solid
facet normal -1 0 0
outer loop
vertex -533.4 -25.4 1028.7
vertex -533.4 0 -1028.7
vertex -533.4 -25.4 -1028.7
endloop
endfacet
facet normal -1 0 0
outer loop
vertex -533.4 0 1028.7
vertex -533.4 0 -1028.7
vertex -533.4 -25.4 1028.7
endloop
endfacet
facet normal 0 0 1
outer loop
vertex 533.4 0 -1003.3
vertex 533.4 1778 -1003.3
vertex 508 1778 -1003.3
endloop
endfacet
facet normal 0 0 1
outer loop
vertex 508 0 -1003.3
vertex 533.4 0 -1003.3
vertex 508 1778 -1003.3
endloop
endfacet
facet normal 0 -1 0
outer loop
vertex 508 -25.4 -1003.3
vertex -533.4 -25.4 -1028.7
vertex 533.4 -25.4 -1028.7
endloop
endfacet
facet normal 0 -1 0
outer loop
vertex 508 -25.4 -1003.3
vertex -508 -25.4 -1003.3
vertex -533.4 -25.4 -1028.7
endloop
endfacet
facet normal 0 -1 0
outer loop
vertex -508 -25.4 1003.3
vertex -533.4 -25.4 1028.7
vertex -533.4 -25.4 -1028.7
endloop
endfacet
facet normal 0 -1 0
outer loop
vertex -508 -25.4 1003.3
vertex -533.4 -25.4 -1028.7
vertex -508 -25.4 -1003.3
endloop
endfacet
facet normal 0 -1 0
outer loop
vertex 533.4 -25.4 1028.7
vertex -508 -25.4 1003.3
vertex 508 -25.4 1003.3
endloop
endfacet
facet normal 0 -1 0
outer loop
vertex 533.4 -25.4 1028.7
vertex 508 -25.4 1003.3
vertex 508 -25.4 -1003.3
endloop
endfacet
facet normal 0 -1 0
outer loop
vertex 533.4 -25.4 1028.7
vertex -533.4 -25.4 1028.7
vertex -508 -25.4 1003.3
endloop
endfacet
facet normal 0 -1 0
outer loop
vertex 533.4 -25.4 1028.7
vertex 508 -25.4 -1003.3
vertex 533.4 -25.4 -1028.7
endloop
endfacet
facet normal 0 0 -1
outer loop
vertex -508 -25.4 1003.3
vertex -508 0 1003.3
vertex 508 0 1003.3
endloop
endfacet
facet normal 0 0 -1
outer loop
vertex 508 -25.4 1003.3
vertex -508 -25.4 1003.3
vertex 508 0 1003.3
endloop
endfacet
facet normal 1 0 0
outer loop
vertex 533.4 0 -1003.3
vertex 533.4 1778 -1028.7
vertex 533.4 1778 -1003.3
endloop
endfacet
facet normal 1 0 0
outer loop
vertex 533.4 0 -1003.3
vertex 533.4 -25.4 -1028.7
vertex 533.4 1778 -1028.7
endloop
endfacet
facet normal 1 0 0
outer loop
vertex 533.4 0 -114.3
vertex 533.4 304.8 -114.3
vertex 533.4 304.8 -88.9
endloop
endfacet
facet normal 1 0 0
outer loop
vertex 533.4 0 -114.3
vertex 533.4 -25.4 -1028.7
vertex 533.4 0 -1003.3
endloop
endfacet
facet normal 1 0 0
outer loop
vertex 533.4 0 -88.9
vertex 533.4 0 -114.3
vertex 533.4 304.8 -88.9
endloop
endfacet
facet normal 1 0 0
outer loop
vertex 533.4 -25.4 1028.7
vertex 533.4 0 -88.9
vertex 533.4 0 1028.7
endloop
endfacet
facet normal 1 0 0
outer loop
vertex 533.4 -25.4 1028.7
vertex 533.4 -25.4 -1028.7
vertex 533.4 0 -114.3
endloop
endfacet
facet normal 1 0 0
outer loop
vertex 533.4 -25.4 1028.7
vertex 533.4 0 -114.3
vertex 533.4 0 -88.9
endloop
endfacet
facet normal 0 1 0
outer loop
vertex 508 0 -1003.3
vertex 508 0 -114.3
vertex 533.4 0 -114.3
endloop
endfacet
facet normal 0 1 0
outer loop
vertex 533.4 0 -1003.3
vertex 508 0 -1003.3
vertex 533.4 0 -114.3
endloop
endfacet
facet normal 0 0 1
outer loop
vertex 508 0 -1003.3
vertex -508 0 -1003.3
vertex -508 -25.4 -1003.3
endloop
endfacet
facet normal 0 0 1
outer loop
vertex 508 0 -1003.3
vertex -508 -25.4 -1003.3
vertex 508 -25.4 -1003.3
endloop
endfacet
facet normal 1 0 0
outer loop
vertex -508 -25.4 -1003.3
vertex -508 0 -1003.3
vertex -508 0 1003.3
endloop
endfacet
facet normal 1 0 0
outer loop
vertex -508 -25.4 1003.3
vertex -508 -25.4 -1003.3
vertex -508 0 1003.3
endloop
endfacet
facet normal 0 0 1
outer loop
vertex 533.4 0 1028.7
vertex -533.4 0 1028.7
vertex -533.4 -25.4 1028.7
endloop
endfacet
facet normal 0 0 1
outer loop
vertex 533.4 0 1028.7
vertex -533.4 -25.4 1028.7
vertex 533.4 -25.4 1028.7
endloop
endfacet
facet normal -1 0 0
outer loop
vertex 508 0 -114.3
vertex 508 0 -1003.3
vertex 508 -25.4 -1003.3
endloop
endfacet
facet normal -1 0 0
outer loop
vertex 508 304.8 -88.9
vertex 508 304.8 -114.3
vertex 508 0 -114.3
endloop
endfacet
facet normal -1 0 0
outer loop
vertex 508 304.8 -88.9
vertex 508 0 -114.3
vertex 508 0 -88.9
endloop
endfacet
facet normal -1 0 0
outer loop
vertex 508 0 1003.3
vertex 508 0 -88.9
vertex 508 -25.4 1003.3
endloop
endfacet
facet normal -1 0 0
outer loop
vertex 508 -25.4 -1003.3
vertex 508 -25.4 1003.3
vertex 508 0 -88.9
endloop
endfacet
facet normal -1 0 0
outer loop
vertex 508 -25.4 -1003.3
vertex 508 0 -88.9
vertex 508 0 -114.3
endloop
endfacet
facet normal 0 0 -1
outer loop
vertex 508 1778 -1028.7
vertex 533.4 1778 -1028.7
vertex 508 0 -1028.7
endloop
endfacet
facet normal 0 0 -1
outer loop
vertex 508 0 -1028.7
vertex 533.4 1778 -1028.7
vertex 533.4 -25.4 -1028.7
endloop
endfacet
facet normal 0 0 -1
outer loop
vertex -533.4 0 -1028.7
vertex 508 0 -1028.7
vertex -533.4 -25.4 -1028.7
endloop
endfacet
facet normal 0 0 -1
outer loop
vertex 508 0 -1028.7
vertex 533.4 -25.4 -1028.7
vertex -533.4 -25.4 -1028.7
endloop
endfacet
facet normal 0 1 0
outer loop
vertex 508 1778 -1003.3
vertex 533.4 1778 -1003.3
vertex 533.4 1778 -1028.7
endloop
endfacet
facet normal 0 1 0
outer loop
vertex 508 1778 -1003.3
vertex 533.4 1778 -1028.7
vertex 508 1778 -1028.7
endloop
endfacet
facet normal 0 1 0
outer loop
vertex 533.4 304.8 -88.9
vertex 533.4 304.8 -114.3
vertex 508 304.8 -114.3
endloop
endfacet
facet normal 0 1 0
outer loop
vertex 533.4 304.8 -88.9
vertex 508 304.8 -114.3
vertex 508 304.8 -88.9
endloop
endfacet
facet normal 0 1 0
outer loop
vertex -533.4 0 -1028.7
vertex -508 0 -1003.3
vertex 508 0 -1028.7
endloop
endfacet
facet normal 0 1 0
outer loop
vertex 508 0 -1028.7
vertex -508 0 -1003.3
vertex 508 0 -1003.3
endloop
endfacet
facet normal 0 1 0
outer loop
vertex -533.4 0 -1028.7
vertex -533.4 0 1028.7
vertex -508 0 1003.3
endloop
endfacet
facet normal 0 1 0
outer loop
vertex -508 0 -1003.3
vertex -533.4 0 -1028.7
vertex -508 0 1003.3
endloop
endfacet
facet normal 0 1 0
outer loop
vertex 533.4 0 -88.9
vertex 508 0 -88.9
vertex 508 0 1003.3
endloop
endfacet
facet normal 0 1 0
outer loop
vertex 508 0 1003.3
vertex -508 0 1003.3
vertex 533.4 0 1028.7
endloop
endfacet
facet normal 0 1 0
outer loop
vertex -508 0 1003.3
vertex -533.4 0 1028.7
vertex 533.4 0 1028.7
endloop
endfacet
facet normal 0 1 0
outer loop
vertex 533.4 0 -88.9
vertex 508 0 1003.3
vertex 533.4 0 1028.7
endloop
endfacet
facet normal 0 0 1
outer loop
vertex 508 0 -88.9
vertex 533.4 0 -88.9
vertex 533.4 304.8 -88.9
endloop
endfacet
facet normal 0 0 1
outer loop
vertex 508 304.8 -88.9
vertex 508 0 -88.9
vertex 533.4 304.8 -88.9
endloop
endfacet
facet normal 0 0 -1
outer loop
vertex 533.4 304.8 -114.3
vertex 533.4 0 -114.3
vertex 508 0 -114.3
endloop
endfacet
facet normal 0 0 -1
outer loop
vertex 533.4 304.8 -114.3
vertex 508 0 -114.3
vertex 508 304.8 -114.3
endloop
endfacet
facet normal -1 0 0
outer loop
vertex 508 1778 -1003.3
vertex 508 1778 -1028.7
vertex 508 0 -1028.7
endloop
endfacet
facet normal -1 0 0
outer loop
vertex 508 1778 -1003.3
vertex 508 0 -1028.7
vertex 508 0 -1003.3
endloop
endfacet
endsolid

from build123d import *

# Parameters (mm, degrees)
F0_W     = 1066.8
F0_H     = 2057.4
F0_W_2   = 1016
F0_H_2   = 2006.6
F1_DEPTH = 25.4
F2_W     = 304.8
F2_H     = 25.4
F3_DEPTH = 25.4
F4_W     = 25.4
F4_H     = 25.4
F5_DEPTH = 1778


with BuildPart() as f1:
    # F0 (on Front) → F1 (new body)
    with BuildSketch(Plane.XZ):
        Rectangle(F0_W, F0_H)
        Rectangle(F0_W_2, F0_H_2, mode=Mode.SUBTRACT)
    extrude(amount=F1_DEPTH)

    # F2 (on face) → F3 (join)
    with BuildSketch(Plane.YZ.offset(533.4)):
        with Locations((152.4, -101.6)):
            Rectangle(F2_W, F2_H)
    extrude(amount=-F3_DEPTH)

    # F4 (on face) → F5 (join)
    with BuildSketch(Plane(origin=(0, 0, 0), x_dir=(-1, 0, 0), z_dir=(0, 1, 0))):
        with Locations((-520.7, -1016)):
            Rectangle(F4_W, F4_H)
    extrude(amount=F5_DEPTH)


solid = f1.part
